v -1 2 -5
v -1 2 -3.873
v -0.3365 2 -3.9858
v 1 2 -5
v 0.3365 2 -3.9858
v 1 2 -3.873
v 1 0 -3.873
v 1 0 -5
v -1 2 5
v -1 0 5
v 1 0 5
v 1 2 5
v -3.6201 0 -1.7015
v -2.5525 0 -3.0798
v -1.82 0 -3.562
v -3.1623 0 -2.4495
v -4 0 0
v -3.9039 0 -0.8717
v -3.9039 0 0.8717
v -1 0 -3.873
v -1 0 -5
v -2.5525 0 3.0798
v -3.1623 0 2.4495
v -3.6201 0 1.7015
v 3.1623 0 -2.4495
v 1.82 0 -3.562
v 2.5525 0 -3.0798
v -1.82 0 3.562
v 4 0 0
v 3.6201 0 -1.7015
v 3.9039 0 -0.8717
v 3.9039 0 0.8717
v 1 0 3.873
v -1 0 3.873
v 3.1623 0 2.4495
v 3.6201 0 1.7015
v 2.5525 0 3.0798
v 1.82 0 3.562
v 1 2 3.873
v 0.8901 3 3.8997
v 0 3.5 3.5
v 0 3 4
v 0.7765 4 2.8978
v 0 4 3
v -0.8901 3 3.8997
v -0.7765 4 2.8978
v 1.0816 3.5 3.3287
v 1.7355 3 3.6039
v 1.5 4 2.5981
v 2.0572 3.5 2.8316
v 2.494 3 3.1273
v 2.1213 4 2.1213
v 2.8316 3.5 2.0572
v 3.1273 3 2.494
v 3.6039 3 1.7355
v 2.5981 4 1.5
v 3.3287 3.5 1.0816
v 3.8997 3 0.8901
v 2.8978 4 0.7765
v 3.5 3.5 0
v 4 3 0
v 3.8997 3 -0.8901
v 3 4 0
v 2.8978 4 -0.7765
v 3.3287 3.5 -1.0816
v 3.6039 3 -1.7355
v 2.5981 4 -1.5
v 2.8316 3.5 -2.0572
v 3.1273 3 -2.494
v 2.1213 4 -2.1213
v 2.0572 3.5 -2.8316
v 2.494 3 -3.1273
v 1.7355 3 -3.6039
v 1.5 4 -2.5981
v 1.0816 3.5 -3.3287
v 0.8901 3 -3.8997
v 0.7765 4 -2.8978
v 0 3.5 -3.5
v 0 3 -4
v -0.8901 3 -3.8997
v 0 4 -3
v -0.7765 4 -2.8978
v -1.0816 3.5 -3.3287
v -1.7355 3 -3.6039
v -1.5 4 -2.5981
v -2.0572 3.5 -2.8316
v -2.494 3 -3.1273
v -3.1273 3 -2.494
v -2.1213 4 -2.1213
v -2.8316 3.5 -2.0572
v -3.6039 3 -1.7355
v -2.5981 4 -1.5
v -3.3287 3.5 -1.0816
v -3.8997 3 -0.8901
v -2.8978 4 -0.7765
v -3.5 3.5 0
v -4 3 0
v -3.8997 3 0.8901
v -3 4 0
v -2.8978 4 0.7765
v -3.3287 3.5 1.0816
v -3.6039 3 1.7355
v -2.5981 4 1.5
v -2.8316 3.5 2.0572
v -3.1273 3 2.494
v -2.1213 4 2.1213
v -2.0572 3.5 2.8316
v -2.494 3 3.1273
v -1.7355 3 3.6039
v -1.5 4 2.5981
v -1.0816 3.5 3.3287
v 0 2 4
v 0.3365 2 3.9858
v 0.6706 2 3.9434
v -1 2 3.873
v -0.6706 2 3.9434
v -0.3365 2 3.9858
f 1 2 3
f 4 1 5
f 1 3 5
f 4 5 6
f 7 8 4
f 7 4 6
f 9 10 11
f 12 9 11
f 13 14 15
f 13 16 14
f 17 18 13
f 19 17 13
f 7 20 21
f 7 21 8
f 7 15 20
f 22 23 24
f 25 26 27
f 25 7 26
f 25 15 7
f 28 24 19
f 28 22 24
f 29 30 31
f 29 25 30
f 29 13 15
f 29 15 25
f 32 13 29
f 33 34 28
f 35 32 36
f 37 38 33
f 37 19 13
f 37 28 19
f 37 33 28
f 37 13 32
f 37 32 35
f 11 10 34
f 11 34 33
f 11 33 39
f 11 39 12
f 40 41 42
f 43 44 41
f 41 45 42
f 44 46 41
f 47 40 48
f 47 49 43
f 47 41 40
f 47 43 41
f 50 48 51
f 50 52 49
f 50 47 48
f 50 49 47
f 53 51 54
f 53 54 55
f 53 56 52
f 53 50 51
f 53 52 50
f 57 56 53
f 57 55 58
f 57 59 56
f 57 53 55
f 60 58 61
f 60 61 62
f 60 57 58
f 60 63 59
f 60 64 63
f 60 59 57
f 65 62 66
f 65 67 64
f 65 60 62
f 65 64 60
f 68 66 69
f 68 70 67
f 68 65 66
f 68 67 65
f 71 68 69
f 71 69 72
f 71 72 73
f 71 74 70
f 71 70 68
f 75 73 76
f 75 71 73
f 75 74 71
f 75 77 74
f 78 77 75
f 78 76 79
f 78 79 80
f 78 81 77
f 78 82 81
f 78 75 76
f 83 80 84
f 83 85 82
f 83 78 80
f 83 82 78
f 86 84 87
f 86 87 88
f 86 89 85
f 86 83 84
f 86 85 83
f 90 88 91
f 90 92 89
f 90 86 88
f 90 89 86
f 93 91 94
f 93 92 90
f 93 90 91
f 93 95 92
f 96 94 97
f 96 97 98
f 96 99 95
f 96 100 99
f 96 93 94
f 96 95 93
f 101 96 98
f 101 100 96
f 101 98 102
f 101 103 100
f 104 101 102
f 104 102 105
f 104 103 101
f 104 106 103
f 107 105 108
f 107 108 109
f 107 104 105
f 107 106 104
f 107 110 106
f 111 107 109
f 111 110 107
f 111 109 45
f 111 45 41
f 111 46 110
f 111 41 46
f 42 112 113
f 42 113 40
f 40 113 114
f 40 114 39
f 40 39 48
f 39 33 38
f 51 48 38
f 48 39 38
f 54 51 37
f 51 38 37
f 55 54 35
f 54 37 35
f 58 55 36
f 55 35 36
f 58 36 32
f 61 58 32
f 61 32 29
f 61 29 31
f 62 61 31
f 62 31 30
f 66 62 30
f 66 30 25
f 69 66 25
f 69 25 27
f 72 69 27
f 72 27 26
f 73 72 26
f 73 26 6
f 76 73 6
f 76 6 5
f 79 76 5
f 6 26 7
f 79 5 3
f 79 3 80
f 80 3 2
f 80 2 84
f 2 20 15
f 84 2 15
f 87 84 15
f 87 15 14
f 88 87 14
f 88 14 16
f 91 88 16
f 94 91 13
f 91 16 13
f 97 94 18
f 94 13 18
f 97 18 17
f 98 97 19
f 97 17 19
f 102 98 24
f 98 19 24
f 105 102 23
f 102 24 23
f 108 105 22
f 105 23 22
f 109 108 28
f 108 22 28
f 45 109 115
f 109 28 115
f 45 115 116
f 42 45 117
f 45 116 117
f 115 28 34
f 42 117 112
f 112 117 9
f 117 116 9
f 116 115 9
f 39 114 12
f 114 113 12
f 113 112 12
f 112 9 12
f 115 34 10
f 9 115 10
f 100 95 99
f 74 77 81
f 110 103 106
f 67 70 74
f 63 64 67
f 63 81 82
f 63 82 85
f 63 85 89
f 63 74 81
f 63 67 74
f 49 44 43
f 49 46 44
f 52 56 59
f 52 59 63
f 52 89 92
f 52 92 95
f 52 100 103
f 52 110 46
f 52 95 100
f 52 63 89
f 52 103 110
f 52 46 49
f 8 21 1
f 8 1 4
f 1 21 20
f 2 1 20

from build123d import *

# Parameters (mm, degrees)
SKETCH1_R           = 4
BOSS_EXTRUDE1_DEPTH = 4
SKETCH2_W           = 2
SKETCH2_H           = 10
BOSS_EXTRUDE2_DEPTH = 2
CHAMFER1_SIZE       = 1


with BuildPart() as part:
    # Sketch1 → Boss-Extrude1 (new body)
    with BuildSketch(Plane(origin=(0, 0, 0), x_dir=(1, 0, 0), z_dir=(0, 1, 0))):
        with Locations(Location((0, 0, 0), (0, 0, 270))):
            Circle(SKETCH1_R)
    extrude(amount=BOSS_EXTRUDE1_DEPTH)

    # Sketch2 → Boss-Extrude2 (add)
    with BuildSketch(Plane.XZ):
        Rectangle(SKETCH2_W, SKETCH2_H)
    extrude(amount=-BOSS_EXTRUDE2_DEPTH)

    # Chamfer1
    chamfer1_edges = [part.edges().sort_by_distance(p)[0] for p in [
        (0, 4, -4),
    ]]
    chamfer(chamfer1_edges, length=CHAMFER1_SIZE)


solid = part.part
